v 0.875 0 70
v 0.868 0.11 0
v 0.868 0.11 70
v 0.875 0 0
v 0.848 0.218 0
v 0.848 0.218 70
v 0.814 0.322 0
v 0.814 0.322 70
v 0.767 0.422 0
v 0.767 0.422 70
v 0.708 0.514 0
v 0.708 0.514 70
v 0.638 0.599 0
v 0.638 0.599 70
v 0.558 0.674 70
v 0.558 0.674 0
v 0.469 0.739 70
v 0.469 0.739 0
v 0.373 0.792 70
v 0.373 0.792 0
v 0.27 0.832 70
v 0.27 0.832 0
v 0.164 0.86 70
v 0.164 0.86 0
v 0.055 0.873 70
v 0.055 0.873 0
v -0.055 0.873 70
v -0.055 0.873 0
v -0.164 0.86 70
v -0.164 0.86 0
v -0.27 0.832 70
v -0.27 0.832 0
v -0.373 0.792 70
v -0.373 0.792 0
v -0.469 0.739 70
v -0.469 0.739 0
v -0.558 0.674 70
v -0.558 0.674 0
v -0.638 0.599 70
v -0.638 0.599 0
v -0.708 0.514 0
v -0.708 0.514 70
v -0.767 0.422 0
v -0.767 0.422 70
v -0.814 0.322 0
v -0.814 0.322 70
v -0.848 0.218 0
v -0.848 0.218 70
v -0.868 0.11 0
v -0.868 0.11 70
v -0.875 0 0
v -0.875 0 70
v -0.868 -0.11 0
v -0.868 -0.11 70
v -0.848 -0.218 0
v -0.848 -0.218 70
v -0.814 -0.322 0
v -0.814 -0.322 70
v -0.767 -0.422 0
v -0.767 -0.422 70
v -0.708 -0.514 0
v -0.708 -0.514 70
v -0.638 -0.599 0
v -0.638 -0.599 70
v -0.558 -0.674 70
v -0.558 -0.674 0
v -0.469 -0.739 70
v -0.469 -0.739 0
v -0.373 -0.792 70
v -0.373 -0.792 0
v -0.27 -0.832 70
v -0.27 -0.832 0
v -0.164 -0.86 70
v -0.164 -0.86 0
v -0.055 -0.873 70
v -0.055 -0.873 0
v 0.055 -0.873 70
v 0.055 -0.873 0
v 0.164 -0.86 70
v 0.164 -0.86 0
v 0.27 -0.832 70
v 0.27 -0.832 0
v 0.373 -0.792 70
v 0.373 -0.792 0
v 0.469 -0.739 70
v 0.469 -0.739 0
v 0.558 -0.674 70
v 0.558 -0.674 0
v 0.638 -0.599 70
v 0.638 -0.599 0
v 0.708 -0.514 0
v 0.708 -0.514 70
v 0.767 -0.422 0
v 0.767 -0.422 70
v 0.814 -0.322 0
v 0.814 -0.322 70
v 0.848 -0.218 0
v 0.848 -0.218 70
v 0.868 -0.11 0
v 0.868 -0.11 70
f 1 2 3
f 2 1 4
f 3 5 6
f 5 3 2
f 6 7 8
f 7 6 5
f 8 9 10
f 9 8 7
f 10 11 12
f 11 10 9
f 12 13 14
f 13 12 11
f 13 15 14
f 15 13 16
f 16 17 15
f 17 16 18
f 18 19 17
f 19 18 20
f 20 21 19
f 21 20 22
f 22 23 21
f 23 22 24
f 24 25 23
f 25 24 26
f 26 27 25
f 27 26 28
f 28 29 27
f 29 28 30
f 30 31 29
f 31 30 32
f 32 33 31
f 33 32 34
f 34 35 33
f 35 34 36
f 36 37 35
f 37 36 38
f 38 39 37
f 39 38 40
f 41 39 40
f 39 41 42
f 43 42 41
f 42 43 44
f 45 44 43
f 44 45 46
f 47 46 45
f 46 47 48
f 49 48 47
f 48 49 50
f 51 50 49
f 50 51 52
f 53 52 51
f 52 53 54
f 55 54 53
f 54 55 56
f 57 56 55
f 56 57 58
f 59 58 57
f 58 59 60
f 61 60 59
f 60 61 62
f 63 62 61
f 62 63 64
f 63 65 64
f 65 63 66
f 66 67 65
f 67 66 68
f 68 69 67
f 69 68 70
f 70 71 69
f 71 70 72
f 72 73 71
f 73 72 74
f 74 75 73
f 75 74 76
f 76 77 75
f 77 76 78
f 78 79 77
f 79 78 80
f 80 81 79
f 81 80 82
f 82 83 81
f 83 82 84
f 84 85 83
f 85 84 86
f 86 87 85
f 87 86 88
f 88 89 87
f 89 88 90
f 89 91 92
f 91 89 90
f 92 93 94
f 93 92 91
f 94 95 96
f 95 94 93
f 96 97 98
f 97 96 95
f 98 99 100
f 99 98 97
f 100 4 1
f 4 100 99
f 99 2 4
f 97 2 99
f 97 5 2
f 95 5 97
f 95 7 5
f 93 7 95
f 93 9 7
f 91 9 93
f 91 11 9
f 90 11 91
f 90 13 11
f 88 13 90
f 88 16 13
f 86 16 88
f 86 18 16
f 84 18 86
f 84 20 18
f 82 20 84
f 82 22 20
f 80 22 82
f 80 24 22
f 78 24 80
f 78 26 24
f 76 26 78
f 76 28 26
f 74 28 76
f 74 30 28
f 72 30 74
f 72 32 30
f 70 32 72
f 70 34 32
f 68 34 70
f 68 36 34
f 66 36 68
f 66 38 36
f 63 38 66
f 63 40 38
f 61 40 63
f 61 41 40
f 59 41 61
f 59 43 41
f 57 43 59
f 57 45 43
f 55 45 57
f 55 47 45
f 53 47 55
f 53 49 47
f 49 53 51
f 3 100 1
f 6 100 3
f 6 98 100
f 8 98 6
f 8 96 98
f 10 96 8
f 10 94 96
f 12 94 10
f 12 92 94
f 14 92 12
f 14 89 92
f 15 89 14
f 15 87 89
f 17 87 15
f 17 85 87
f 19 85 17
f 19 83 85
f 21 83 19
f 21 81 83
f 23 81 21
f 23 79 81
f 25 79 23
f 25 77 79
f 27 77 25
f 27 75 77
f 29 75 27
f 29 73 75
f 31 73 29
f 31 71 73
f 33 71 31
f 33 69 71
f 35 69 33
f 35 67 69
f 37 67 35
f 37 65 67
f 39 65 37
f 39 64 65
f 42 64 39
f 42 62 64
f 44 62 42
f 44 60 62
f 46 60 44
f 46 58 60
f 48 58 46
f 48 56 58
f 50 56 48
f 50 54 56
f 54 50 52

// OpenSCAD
function FilamentDiam()=1.75;
function FilamentHeight()=70;
module Filament(3DPrinterTolerance=.4)
{
	$fn=50;
	cylinder(h=FilamentHeight(), r=FilamentDiam(3dPrinterTolerance)/2);
}

Filament();
